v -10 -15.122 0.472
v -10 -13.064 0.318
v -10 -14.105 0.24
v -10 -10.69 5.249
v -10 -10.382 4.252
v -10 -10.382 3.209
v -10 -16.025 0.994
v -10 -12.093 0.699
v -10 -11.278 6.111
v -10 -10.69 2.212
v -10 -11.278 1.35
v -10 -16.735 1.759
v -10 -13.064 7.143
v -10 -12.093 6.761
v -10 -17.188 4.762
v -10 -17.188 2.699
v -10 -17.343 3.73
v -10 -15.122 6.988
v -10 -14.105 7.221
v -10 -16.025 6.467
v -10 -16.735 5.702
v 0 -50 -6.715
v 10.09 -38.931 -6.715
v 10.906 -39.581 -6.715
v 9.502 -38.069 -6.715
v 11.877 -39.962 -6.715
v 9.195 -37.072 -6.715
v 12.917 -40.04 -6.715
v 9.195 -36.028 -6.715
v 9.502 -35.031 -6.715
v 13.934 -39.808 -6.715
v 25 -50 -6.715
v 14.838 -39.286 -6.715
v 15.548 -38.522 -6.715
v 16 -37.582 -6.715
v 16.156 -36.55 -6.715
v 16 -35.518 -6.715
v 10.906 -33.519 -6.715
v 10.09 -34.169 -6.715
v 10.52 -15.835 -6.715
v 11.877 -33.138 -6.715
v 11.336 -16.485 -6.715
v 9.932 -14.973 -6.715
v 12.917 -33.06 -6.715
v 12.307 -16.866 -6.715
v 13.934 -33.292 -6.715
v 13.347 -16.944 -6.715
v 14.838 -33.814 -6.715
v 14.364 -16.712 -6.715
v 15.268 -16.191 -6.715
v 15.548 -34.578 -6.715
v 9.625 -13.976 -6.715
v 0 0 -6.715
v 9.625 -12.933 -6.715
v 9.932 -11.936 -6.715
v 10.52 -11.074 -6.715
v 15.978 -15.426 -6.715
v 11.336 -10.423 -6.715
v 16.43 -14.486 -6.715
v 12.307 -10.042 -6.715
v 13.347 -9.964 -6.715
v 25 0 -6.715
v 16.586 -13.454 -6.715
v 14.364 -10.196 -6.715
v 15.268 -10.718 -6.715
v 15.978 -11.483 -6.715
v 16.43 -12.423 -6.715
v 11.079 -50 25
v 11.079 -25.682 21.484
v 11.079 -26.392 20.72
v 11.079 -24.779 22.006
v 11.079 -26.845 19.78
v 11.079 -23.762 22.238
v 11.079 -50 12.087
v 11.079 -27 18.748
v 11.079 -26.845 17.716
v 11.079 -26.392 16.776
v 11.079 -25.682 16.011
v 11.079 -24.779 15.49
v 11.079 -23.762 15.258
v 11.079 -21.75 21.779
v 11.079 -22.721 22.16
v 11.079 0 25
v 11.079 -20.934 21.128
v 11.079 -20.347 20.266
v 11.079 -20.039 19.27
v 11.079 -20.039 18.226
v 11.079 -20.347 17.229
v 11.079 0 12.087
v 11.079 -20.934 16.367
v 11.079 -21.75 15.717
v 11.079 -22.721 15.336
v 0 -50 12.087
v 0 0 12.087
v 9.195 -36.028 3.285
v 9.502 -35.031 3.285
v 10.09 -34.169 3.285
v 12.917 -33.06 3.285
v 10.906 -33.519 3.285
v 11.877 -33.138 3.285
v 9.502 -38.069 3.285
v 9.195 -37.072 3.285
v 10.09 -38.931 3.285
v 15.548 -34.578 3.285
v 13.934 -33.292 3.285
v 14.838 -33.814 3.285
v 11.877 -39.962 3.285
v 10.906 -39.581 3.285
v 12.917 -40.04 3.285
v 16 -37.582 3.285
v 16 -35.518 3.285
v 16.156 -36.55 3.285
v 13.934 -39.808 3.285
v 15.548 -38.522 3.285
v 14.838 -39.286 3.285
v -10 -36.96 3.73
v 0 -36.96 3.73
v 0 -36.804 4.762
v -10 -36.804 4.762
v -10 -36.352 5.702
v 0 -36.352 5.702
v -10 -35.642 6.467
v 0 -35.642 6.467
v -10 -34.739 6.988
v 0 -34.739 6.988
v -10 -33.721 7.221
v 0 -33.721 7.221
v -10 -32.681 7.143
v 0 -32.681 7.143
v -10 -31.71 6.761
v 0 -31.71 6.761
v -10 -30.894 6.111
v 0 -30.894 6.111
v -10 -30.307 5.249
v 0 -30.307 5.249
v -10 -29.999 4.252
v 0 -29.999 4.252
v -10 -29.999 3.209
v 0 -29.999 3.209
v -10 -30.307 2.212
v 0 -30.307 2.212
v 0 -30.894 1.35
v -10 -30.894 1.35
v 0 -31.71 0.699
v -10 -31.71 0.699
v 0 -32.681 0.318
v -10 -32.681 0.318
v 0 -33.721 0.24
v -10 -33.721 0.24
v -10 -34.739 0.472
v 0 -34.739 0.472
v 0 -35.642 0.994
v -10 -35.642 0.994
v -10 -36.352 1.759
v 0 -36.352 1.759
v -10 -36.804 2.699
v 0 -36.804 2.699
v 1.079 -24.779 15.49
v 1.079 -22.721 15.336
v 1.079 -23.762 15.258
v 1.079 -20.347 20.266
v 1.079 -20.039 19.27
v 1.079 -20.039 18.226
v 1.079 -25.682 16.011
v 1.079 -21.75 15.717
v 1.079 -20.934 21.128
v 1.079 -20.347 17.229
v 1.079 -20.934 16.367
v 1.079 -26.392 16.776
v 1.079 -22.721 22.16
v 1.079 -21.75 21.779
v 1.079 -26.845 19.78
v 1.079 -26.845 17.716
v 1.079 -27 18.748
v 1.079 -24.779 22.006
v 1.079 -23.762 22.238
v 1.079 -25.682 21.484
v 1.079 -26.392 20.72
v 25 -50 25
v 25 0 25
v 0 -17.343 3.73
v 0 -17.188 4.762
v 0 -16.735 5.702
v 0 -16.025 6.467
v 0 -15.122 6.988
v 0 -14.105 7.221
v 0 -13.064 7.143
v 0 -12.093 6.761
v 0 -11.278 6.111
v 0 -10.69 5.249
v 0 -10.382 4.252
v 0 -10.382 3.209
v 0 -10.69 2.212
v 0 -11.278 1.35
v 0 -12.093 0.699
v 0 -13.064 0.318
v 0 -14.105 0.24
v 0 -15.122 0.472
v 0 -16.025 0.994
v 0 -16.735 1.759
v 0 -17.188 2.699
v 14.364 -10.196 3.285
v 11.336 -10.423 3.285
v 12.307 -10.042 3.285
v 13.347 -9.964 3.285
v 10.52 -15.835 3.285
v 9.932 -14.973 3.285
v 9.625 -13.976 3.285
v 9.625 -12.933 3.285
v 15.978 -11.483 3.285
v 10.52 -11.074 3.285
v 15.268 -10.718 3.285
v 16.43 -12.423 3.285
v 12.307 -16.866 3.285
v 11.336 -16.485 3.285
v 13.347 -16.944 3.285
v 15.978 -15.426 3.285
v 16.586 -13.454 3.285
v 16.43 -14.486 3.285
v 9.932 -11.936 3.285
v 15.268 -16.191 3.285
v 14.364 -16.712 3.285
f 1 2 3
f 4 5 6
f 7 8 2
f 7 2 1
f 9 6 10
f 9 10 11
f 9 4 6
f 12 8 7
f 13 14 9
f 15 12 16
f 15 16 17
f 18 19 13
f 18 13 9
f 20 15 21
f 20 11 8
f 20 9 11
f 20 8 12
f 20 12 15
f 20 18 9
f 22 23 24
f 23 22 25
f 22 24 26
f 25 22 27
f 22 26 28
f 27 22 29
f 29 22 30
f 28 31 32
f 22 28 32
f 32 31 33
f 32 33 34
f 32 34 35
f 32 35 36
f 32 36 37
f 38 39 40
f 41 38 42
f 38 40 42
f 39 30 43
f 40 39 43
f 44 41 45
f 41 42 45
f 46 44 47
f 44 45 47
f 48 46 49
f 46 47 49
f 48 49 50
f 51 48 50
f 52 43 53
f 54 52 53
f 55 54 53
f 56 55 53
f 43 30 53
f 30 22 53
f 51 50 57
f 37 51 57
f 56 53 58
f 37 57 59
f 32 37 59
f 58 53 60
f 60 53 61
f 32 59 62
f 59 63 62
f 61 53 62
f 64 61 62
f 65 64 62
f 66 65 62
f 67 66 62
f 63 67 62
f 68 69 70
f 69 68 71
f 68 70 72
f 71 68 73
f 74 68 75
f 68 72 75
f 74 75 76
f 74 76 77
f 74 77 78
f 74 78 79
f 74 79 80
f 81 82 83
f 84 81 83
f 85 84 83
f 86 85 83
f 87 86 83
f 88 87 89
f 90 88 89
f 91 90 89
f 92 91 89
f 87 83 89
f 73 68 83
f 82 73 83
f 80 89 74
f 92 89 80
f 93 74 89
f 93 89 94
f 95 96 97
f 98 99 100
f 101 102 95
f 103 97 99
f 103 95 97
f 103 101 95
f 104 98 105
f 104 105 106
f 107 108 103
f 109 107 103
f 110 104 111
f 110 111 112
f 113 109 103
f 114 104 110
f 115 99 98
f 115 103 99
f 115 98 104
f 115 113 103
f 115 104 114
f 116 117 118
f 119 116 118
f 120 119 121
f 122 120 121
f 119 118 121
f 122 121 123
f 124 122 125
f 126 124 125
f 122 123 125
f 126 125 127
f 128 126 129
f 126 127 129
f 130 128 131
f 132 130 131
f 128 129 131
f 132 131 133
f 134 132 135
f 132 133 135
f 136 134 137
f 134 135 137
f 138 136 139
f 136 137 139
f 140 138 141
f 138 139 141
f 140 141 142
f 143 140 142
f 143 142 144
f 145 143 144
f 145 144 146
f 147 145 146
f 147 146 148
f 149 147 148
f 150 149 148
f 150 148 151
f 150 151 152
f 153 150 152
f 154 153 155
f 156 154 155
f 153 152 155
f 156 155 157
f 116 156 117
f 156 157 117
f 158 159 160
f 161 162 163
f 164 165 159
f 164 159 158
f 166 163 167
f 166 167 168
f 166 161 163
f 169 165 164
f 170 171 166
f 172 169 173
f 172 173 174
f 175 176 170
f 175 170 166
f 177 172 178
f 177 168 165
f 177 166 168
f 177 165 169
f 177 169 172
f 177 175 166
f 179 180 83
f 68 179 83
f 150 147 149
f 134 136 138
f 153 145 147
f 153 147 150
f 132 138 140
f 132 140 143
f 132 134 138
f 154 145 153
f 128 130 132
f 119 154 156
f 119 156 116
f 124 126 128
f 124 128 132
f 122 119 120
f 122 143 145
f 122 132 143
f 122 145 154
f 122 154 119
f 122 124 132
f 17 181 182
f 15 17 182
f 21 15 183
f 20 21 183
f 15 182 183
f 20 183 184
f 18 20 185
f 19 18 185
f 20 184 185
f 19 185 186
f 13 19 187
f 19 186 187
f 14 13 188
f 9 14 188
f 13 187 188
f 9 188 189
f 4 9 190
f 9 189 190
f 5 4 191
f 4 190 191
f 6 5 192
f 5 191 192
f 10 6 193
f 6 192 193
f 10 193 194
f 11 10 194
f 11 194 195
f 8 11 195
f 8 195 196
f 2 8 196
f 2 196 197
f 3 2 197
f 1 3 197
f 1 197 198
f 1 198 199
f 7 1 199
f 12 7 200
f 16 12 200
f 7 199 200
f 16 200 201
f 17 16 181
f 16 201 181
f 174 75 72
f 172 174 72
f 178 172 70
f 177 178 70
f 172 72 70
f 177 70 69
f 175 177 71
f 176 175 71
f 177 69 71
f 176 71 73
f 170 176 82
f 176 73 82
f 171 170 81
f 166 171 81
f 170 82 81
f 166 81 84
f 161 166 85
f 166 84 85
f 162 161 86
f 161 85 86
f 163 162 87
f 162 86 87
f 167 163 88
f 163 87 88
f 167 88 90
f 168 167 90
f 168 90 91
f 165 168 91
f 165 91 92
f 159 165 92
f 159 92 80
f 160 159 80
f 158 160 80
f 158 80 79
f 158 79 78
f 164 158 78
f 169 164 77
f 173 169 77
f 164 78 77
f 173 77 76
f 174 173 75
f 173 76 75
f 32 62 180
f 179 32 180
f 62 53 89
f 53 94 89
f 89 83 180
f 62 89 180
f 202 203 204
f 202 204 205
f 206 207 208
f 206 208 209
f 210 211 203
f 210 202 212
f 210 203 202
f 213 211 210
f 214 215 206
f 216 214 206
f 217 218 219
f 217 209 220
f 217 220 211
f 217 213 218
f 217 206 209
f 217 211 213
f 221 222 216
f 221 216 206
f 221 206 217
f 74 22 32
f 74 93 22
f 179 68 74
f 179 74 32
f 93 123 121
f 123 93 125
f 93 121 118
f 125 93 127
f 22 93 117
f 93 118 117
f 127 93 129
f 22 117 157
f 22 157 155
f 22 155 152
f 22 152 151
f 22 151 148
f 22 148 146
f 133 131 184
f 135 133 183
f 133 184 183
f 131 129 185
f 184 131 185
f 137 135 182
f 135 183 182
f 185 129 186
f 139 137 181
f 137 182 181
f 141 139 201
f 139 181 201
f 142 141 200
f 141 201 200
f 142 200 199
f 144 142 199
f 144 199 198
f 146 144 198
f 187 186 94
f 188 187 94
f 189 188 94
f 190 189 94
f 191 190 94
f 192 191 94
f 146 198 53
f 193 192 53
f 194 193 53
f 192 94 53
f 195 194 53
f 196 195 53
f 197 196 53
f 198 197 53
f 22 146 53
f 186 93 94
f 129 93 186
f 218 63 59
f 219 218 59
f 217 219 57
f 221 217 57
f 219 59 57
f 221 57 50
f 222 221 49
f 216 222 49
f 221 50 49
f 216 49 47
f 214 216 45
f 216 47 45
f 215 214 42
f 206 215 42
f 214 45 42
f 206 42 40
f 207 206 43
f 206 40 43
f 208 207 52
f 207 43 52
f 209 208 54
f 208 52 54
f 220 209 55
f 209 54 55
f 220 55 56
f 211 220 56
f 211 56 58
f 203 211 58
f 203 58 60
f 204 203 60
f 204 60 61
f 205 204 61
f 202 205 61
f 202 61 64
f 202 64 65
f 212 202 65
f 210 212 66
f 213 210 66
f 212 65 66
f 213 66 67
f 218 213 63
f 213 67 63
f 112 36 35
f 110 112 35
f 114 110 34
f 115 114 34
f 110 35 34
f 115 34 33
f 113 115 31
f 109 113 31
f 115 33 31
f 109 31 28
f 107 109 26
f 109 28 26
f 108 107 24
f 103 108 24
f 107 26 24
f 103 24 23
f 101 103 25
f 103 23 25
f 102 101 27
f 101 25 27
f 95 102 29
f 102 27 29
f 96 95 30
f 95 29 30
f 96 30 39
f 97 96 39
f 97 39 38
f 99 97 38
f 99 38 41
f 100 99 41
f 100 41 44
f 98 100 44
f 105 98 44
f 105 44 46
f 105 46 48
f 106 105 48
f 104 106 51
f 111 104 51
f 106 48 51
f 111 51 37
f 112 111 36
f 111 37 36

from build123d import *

# Parameters (mm, degrees)
F1_DEPTH = 50
F2_R     = 3.5
F3_DEPTH = 10
F4_R     = 3.5
F5_DEPTH = 10
F6_R     = 3.5
F7_DEPTH = 10


# Not quite as in the source:
# - a feature names something its author has since deleted; it is built from what else it names


with BuildPart() as f1:
    # F0 (on Front) → F1 (new body)
    with BuildSketch(Plane.XZ):
        Polygon((0, -6.7148432136), (25, -6.7148432136), (25, 25), (11.0791092739, 25), (11.0791092739, 12.0865814388), (0, 12.0865814388), align=None)
    extrude(amount=F1_DEPTH)

    # F2 (on face) → F3 (join)
    with BuildSketch(Plane(origin=(0, 0, 0), x_dir=(0, -1, 0), z_dir=(-1, 0, 0))):
        with Locations((13.8432676521, 3.730392782)):
            Circle(F2_R)
        with Locations((33.459926671, 3.730392782)):
            Circle(F2_R)
    extrude(amount=F3_DEPTH)

    # F4 (on face) → F5 (cut)
    with BuildSketch(Plane(origin=(0, 0, -6.7148432136), x_dir=(1, 0, 0), z_dir=(0, 0, -1))):
        with Locations((12.6557382198, 36.55)):
            Circle(F4_R)
        with Locations((13.0857451583, 13.4541578871)):
            Circle(F4_R)
    extrude(amount=-F5_DEPTH, mode=Mode.SUBTRACT)

    # F6 (on face) → F7 (join)
    with BuildSketch(Plane(origin=(11.0791092739, 0, 0), x_dir=(0, -1, 0), z_dir=(-1, 0, 0))):
        with Locations((23.5, 18.7478940934)):
            Circle(F6_R)
    extrude(amount=F7_DEPTH)


solid = f1.part
